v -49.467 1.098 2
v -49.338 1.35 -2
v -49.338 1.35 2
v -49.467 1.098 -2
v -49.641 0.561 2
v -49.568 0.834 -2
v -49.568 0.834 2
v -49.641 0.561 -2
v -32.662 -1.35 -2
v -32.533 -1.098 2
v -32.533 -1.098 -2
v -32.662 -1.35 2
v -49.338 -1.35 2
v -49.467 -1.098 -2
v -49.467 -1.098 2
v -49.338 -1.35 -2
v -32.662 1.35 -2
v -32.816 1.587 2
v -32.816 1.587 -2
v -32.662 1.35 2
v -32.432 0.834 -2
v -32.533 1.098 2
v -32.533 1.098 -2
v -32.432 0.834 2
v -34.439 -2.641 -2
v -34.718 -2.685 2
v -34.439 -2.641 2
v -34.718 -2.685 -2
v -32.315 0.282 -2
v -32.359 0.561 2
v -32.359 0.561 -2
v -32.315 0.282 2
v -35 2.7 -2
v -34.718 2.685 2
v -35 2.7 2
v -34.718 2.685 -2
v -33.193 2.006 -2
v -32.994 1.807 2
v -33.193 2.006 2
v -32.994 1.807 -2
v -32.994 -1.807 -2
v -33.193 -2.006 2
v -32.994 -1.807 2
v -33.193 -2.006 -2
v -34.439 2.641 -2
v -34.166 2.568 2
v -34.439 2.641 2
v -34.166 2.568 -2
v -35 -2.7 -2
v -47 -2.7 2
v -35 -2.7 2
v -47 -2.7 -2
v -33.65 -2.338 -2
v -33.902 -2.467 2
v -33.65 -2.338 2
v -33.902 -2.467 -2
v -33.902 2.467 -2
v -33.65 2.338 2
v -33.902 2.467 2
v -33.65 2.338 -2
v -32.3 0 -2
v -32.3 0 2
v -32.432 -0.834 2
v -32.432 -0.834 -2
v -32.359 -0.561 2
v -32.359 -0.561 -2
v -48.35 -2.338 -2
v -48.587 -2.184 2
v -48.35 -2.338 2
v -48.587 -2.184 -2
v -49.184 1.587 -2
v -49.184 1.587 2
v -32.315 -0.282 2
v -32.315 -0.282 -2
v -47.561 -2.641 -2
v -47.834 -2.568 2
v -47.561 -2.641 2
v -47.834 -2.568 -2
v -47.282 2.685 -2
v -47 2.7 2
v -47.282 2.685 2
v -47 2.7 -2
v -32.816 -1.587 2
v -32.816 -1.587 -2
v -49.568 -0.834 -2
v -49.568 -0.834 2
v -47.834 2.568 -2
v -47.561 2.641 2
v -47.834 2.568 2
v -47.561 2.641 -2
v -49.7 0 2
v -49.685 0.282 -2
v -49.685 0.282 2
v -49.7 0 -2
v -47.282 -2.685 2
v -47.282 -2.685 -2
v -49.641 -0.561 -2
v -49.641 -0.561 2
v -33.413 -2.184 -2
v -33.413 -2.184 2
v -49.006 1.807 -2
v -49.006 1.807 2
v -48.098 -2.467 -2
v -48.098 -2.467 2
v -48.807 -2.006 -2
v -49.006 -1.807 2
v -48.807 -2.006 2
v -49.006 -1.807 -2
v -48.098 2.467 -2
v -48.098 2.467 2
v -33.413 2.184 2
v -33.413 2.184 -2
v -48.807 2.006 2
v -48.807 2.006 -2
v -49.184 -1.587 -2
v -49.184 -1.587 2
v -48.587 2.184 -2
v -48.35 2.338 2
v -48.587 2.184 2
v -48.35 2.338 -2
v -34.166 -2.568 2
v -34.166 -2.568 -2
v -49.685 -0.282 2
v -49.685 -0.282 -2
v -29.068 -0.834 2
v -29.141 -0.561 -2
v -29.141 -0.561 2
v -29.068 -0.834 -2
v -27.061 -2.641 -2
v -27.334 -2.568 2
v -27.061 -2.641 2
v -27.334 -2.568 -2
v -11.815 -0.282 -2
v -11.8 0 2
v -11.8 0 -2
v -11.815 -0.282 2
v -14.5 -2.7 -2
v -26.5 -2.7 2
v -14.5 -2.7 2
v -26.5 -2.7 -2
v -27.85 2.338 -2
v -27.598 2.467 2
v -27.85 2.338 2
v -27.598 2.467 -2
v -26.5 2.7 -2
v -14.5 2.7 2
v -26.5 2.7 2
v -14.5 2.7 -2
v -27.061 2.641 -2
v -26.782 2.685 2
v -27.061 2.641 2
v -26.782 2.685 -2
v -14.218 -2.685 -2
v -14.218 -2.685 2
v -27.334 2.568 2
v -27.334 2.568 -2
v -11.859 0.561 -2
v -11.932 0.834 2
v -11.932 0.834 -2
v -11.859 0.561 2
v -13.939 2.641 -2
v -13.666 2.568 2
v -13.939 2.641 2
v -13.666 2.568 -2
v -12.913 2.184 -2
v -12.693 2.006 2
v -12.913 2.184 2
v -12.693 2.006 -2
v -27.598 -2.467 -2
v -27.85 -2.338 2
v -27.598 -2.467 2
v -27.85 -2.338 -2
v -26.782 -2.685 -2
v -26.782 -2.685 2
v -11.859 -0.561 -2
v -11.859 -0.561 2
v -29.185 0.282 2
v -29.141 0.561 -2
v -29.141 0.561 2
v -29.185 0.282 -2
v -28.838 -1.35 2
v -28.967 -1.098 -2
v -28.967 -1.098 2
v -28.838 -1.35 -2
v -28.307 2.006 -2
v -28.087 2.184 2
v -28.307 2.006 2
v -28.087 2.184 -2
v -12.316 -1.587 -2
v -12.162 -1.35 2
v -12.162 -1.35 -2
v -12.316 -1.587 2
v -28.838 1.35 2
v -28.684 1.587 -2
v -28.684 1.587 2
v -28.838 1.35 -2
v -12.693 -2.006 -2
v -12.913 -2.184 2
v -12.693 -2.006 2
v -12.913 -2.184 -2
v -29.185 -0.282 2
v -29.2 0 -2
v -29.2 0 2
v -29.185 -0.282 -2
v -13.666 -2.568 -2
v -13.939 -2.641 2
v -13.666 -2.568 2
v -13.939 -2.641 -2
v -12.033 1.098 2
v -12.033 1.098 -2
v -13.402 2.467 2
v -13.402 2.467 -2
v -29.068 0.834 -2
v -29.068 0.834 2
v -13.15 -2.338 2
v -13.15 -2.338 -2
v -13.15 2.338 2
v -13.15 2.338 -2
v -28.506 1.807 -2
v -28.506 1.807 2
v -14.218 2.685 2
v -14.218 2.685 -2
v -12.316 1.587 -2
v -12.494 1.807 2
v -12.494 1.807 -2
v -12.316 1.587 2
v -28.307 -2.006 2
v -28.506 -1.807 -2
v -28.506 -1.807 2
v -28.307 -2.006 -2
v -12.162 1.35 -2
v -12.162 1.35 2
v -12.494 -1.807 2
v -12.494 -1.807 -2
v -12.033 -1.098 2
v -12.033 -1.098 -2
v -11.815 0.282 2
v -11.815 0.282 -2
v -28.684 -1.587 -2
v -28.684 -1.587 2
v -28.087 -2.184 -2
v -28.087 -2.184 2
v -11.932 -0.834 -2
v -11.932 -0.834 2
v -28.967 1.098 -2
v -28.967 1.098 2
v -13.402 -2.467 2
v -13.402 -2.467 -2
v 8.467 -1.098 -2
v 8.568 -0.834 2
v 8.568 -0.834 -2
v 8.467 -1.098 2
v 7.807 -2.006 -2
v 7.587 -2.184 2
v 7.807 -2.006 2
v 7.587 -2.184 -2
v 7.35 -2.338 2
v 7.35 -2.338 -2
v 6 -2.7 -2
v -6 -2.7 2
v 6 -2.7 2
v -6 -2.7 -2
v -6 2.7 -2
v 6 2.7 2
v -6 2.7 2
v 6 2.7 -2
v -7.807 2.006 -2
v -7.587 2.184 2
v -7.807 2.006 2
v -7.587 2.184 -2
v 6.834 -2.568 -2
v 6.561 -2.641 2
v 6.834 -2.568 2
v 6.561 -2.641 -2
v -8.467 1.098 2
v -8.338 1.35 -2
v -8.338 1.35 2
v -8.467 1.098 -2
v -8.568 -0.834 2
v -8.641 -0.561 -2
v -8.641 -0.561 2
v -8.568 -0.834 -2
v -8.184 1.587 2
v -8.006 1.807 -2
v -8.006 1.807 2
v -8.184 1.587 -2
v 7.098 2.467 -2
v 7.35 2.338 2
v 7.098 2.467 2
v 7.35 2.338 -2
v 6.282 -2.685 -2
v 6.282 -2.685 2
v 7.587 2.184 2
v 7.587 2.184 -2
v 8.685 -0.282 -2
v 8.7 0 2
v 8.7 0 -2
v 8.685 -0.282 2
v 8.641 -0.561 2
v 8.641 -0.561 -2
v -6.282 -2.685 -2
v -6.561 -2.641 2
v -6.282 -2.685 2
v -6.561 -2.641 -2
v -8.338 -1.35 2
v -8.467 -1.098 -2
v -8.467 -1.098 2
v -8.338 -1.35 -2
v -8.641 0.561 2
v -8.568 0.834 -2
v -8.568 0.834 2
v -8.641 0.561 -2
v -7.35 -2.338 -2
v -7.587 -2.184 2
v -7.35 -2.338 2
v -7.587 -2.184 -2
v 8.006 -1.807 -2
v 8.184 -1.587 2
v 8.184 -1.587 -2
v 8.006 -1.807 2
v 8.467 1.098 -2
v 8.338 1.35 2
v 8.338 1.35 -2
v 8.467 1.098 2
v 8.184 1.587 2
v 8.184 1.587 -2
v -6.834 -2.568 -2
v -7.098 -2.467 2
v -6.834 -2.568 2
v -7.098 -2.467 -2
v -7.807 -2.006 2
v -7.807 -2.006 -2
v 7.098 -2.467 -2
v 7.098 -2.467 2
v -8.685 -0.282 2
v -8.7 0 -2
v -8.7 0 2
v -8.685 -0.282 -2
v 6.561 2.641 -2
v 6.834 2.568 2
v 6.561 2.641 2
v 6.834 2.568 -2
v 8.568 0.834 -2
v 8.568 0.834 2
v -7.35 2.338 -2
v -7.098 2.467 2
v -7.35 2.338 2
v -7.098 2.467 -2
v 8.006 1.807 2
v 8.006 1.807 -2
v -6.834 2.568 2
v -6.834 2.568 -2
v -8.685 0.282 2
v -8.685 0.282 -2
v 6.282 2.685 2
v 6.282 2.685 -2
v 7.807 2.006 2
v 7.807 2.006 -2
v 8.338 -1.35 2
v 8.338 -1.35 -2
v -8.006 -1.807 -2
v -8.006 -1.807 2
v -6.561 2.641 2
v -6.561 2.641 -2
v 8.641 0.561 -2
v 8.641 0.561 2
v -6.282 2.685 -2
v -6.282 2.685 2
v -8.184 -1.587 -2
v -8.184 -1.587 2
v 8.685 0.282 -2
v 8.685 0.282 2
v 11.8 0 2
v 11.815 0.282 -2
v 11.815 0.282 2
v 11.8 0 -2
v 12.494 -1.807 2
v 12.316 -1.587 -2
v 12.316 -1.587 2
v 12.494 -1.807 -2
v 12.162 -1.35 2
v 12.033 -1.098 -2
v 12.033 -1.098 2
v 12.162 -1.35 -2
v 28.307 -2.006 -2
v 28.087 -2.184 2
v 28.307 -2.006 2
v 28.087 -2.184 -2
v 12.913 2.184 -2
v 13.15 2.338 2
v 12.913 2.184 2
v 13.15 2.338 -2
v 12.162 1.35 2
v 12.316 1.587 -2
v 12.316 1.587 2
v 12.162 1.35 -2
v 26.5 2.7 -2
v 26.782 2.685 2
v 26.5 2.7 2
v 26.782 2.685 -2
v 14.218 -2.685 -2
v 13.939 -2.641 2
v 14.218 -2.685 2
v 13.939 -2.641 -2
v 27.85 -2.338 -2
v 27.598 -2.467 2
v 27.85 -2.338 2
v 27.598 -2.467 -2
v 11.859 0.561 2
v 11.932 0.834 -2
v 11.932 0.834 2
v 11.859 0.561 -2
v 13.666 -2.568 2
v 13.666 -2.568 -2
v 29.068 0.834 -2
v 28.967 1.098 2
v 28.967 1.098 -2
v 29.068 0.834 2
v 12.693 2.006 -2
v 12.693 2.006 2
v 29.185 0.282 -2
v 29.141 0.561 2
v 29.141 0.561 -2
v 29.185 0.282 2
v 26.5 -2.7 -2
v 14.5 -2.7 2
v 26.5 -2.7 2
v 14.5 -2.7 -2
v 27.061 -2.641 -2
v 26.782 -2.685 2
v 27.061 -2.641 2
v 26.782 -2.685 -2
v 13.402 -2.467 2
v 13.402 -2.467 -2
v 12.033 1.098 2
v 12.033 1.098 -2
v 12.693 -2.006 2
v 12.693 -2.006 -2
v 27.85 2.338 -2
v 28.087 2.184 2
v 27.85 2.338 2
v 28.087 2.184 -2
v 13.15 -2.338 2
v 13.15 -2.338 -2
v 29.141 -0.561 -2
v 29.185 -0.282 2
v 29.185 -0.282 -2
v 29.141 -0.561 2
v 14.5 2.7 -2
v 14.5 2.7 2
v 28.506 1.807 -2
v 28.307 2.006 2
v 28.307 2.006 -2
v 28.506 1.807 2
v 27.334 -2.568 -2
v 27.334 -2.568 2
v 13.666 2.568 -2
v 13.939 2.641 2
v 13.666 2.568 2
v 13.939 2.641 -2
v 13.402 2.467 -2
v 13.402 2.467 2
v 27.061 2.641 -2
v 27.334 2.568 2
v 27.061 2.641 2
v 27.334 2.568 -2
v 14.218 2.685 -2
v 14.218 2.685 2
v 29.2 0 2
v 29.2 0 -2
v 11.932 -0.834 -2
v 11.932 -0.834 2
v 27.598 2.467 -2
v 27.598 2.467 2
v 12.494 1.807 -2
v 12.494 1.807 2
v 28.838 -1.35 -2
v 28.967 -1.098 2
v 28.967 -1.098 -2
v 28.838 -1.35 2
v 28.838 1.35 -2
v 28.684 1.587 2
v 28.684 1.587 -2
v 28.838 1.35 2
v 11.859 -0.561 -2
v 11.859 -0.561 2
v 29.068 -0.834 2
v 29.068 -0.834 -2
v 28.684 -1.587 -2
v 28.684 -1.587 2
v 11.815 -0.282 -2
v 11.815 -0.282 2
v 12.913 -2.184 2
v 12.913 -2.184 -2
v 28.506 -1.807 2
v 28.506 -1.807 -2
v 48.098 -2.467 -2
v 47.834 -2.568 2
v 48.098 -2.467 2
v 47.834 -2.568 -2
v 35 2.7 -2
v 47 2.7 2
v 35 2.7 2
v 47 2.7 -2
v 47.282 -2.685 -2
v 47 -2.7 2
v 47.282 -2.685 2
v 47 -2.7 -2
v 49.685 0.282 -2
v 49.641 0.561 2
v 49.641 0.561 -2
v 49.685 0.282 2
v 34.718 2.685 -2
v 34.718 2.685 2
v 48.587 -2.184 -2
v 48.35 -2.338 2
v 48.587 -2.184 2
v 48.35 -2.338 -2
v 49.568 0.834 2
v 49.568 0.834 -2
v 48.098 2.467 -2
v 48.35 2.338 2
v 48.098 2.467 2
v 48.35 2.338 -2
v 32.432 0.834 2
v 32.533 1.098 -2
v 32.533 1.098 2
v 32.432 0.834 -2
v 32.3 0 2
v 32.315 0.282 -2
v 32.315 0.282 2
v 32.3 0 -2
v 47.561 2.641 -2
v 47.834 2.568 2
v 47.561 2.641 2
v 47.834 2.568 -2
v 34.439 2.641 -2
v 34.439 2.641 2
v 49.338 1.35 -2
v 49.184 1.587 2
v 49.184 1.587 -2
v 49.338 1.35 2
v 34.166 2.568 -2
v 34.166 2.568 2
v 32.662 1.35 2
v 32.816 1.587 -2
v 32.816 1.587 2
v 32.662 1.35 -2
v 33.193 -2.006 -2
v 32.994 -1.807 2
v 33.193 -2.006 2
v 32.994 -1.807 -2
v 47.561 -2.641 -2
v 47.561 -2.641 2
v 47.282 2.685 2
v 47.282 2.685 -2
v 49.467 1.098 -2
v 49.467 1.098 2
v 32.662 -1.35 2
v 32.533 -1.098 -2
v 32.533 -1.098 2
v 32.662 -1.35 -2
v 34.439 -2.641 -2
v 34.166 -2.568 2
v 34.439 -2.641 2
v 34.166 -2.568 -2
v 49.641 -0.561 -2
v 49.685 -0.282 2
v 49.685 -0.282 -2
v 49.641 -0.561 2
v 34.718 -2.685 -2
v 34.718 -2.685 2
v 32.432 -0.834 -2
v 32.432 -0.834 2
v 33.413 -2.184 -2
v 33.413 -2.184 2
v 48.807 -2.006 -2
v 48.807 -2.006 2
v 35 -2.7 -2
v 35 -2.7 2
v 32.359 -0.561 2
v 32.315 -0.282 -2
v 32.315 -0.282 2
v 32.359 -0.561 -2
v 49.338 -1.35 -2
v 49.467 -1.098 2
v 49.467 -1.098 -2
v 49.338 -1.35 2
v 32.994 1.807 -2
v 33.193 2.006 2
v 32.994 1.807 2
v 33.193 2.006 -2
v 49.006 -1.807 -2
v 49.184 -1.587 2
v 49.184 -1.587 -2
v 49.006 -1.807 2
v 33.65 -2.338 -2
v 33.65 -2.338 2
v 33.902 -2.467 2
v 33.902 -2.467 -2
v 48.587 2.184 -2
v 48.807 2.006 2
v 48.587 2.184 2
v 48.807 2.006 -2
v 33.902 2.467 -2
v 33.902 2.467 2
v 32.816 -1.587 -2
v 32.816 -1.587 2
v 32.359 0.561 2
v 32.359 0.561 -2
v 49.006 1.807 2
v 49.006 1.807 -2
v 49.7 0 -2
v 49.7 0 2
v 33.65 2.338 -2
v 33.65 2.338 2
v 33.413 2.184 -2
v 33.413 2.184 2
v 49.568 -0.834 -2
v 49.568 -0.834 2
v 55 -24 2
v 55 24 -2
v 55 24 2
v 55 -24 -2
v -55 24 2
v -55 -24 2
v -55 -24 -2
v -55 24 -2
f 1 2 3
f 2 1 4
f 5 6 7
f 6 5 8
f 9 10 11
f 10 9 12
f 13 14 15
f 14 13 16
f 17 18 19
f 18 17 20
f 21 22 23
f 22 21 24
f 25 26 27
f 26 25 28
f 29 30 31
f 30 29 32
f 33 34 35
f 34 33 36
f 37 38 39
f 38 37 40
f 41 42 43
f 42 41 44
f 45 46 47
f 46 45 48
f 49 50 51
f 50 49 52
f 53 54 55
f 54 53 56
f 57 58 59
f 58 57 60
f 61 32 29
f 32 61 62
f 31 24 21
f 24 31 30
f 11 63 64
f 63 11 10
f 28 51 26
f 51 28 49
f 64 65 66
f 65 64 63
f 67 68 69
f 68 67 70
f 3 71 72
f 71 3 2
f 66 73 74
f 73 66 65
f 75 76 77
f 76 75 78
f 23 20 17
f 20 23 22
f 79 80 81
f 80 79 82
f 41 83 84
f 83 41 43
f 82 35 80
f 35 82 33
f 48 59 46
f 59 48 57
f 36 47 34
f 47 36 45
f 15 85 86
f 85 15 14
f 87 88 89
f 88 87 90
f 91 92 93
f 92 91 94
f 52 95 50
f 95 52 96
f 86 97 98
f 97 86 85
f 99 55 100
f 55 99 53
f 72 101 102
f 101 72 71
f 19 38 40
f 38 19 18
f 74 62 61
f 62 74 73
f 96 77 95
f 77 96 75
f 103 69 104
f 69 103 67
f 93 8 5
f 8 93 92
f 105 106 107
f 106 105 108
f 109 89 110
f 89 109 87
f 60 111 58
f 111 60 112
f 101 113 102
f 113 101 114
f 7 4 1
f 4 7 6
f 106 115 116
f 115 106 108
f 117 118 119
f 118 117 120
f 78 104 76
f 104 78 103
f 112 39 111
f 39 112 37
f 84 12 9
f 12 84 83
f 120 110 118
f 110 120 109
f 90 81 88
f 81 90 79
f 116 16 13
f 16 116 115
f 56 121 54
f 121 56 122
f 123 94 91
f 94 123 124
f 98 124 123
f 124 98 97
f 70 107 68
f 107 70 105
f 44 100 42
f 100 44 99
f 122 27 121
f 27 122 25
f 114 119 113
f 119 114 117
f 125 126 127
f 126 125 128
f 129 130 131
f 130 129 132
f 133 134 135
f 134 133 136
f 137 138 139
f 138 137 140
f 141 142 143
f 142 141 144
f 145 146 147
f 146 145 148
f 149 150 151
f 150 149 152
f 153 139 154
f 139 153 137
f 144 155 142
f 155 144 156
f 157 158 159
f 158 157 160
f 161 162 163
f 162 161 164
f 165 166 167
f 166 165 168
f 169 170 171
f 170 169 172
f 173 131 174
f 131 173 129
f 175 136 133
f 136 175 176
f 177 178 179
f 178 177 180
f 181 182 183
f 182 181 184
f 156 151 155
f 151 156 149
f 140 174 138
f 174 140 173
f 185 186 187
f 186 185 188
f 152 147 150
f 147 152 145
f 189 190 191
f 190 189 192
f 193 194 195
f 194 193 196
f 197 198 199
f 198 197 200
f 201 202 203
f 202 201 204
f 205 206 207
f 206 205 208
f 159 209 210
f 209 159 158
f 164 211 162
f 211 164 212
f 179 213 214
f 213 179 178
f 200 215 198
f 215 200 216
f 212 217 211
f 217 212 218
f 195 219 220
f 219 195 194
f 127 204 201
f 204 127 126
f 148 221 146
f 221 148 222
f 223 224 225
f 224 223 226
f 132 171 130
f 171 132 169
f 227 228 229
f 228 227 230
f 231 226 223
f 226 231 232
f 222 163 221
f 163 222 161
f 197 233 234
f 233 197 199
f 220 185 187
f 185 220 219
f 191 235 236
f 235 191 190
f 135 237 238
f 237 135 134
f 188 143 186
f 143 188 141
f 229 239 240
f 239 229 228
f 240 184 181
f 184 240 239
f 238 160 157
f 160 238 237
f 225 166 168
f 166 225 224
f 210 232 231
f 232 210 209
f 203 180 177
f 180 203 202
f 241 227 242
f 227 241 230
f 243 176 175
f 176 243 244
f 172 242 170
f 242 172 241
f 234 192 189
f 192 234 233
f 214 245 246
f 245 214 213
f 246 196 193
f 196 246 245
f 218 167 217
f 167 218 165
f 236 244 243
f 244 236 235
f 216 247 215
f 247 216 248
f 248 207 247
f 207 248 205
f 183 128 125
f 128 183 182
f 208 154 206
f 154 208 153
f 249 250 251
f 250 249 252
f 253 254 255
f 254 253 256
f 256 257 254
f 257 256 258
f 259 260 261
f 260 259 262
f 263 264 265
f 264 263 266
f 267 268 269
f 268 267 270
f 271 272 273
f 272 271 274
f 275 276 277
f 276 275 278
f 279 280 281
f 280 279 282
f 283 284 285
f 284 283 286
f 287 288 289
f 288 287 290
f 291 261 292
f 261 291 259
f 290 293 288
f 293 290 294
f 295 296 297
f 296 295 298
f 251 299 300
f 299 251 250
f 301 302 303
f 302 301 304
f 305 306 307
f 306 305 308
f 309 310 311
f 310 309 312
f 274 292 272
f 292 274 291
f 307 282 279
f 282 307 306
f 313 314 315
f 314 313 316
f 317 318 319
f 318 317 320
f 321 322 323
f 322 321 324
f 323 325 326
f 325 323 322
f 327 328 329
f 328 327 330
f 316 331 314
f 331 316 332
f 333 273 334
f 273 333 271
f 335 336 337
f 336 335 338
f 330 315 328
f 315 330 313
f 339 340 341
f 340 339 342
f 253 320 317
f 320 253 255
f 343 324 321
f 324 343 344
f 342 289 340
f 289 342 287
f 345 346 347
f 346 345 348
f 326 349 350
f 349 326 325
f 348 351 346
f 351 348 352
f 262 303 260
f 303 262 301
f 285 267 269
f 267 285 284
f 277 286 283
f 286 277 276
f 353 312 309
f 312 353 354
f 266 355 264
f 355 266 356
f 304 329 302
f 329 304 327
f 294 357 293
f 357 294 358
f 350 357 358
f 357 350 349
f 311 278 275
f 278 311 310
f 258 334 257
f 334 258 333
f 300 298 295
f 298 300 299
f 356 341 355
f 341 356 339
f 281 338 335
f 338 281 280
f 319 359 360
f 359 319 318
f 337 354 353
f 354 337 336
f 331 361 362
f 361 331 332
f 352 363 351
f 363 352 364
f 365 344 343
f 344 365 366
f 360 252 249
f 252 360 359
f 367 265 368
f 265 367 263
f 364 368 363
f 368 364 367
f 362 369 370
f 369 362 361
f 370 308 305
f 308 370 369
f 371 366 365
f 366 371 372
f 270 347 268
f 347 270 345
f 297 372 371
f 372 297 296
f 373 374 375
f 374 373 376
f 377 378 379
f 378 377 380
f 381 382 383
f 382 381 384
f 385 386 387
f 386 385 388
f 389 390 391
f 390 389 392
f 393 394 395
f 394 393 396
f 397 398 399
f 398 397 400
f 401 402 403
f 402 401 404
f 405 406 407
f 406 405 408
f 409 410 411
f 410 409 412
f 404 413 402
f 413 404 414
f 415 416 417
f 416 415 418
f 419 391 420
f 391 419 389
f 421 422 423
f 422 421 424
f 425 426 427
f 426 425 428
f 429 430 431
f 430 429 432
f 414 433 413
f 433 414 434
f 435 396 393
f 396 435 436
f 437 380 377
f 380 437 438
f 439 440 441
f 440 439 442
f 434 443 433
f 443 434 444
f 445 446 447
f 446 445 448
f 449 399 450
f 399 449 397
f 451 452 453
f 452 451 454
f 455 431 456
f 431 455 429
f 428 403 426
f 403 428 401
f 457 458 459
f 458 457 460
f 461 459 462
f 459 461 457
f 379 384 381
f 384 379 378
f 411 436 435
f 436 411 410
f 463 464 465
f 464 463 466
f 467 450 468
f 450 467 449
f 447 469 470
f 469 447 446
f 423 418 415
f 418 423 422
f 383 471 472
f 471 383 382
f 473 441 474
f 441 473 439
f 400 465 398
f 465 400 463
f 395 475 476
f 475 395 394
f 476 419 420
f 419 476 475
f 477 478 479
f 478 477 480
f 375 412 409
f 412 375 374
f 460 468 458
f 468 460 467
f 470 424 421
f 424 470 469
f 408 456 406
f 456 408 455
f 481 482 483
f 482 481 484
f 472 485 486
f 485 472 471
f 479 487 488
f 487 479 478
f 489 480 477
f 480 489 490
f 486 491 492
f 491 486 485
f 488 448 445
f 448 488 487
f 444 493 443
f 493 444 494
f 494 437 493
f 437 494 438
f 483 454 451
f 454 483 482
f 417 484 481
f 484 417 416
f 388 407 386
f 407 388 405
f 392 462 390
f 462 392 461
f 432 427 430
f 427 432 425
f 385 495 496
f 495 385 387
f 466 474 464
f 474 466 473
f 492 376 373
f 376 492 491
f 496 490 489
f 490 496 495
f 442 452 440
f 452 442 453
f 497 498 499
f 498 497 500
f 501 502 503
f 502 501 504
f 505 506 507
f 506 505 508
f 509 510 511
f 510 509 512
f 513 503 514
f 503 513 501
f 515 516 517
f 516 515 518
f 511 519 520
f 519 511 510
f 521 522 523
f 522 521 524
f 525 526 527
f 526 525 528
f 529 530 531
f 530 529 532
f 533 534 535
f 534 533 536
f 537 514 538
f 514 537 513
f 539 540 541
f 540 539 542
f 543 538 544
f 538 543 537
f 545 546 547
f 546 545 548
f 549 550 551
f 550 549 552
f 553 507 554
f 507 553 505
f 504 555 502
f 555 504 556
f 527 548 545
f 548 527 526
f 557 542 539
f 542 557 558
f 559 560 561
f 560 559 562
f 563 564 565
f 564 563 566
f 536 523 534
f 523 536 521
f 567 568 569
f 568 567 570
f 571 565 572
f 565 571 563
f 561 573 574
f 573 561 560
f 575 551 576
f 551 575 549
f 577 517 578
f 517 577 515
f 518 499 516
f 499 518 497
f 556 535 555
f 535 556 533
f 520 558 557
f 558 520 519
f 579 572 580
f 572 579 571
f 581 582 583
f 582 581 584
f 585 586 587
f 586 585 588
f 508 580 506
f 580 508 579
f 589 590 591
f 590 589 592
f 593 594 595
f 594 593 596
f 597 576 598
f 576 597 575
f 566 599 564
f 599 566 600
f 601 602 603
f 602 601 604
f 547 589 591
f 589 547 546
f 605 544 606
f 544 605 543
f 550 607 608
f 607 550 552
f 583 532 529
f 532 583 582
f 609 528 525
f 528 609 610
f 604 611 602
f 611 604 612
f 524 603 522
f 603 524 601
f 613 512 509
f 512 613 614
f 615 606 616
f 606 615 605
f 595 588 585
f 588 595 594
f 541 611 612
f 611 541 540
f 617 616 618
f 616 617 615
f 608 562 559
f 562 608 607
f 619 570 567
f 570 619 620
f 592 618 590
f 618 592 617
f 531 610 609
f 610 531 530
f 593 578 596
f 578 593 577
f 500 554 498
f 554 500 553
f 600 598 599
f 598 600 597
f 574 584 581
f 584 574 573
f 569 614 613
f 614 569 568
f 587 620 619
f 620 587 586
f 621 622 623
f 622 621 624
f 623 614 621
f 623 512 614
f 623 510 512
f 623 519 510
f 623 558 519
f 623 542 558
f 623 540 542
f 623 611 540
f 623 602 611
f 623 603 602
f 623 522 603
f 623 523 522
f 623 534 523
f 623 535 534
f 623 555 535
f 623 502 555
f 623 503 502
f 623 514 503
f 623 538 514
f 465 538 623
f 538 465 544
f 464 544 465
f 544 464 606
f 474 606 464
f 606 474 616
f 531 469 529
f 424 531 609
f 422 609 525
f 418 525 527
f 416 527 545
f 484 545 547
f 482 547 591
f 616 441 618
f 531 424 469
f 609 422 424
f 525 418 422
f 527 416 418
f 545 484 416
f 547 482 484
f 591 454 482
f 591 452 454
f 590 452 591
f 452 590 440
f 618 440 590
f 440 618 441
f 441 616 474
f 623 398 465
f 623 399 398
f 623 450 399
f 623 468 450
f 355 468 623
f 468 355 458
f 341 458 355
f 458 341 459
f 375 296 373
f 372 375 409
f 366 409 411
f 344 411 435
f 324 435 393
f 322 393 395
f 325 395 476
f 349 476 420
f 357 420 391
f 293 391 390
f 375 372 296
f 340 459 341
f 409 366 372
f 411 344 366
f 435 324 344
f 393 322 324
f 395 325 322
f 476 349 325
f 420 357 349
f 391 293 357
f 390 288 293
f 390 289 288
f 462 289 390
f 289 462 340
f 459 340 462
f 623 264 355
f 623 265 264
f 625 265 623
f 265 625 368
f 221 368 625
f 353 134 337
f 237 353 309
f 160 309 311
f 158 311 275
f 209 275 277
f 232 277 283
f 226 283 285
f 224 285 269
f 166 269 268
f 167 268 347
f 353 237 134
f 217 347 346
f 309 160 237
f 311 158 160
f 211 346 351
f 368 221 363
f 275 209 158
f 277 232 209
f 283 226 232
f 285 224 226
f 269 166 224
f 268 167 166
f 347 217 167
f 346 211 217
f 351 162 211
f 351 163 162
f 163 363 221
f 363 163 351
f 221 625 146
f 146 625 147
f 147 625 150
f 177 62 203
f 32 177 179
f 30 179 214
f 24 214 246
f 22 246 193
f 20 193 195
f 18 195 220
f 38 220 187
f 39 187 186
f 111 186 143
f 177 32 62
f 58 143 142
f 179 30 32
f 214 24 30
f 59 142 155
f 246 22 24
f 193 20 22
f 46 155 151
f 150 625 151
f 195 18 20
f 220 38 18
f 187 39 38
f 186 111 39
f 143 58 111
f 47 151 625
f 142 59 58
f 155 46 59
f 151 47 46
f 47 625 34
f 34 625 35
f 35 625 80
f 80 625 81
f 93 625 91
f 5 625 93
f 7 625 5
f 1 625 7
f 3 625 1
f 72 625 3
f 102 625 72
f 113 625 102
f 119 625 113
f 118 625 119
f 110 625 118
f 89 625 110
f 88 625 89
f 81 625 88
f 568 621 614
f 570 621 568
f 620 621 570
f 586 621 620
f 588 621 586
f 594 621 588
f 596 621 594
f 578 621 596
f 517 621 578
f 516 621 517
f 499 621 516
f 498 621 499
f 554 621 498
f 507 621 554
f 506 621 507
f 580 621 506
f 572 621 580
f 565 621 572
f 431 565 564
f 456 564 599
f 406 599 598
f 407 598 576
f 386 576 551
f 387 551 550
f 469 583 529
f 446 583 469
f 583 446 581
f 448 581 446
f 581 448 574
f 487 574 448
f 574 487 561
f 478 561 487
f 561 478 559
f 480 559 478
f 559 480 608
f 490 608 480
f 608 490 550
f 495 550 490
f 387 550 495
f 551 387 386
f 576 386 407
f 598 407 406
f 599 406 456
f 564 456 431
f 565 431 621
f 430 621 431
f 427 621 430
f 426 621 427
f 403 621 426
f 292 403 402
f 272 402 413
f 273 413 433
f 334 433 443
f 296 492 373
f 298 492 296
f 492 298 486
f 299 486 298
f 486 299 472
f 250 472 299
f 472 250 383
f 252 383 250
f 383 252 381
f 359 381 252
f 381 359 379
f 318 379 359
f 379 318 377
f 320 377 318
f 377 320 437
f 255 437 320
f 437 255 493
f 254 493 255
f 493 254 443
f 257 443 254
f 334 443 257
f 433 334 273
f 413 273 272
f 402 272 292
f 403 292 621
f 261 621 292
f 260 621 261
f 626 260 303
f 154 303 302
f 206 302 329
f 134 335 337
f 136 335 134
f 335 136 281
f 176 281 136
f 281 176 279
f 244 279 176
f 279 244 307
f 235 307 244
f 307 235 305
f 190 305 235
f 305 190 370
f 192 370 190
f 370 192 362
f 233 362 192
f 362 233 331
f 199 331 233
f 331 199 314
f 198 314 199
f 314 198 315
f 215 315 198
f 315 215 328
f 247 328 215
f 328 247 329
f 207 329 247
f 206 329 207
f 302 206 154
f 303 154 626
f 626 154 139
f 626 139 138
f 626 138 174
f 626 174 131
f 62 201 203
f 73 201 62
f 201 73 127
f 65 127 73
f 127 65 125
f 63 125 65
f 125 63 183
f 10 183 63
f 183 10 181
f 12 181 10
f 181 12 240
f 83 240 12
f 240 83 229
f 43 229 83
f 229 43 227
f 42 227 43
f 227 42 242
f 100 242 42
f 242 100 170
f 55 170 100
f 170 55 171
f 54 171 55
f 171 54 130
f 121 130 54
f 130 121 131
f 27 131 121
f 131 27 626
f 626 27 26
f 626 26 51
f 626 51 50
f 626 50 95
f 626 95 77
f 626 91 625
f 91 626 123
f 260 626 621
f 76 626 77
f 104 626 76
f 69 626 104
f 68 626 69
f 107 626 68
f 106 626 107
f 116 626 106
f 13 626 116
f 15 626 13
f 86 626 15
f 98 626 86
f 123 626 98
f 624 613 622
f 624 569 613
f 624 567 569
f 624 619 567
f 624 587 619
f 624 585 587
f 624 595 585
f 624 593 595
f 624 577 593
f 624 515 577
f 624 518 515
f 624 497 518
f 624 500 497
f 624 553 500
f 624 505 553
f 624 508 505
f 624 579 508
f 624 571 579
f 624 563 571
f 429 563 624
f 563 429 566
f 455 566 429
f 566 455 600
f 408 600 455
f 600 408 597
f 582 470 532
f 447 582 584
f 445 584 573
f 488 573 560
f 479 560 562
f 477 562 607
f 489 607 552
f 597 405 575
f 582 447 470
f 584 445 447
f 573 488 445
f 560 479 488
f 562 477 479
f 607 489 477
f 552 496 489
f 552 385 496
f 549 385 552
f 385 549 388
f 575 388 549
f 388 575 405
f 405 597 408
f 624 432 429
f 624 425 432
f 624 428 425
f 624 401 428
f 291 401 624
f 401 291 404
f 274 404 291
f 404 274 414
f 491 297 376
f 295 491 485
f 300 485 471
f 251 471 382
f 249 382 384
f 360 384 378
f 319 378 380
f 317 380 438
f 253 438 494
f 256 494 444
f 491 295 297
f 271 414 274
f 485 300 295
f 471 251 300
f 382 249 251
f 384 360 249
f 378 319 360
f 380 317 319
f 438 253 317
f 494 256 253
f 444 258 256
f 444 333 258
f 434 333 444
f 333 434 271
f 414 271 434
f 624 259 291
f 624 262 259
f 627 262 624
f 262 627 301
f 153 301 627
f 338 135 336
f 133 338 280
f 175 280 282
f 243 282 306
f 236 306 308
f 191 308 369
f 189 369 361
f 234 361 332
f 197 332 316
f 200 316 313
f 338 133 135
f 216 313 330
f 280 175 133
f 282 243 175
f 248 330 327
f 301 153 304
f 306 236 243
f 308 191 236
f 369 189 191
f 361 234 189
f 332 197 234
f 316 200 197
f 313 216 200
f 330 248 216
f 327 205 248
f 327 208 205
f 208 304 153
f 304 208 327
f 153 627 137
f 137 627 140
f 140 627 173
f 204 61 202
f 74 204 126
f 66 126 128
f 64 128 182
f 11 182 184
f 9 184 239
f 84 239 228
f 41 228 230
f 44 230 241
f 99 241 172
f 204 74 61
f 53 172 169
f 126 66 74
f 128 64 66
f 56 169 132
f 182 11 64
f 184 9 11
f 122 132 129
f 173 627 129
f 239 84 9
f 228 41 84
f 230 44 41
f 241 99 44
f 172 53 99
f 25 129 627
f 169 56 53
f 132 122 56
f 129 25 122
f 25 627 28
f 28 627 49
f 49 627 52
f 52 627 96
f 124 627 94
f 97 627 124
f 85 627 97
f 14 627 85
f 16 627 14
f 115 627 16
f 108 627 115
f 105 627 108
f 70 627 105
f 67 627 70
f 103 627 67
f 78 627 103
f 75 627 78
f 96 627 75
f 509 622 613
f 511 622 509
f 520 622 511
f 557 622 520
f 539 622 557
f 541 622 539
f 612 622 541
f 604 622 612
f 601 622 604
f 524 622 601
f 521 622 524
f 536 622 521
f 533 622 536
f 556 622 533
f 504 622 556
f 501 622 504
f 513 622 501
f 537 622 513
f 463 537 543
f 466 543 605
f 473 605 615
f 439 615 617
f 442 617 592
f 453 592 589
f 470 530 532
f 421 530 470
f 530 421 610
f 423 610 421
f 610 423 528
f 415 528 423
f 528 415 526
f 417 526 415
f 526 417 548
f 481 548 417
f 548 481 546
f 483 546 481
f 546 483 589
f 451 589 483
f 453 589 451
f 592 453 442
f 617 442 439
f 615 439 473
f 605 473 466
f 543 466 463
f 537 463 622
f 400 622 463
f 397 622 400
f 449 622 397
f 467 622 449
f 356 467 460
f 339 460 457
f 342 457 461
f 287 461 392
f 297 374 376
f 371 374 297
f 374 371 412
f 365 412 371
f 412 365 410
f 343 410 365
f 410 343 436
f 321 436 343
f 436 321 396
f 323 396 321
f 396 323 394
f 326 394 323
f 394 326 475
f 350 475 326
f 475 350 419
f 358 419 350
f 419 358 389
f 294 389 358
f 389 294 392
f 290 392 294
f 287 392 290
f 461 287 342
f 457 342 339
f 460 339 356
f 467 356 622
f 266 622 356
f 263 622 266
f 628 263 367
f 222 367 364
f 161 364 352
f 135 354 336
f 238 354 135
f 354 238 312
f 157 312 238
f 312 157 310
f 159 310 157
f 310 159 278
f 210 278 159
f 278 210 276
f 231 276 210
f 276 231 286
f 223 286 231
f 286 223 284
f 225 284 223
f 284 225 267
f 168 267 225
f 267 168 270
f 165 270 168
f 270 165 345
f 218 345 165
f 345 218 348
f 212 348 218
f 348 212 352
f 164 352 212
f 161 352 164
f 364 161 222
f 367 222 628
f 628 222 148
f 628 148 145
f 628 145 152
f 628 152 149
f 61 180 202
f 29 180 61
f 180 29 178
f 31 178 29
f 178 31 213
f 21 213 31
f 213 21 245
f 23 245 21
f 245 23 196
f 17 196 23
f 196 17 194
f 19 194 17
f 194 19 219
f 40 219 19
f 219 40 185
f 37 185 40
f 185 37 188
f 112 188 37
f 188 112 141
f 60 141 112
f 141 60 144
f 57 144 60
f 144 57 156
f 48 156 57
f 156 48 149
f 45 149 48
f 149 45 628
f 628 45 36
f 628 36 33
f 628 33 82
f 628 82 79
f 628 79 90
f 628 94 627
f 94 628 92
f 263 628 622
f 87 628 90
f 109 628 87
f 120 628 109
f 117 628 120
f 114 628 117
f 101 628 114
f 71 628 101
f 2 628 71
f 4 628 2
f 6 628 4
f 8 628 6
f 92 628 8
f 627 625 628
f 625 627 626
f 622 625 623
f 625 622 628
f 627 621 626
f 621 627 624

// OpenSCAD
// Slotted mounting plate.
$fn = 60;
eps = 0.02;
plate_l = 110;
plate_w = 48;
plate_t = 4;
slot_l = 12;
module slot(x) { hull() { translate([x-slot_l/2,0,-plate_t/2-eps]) cylinder(d=5.4,h=plate_t+2*eps); translate([x+slot_l/2,0,-plate_t/2-eps]) cylinder(d=5.4,h=plate_t+2*eps); } }
difference() { cube([plate_l,plate_w,plate_t],center=true); for(i=[0:4]) slot(-plate_l/2+14+i*(plate_l-28)/max(1,4)); }
